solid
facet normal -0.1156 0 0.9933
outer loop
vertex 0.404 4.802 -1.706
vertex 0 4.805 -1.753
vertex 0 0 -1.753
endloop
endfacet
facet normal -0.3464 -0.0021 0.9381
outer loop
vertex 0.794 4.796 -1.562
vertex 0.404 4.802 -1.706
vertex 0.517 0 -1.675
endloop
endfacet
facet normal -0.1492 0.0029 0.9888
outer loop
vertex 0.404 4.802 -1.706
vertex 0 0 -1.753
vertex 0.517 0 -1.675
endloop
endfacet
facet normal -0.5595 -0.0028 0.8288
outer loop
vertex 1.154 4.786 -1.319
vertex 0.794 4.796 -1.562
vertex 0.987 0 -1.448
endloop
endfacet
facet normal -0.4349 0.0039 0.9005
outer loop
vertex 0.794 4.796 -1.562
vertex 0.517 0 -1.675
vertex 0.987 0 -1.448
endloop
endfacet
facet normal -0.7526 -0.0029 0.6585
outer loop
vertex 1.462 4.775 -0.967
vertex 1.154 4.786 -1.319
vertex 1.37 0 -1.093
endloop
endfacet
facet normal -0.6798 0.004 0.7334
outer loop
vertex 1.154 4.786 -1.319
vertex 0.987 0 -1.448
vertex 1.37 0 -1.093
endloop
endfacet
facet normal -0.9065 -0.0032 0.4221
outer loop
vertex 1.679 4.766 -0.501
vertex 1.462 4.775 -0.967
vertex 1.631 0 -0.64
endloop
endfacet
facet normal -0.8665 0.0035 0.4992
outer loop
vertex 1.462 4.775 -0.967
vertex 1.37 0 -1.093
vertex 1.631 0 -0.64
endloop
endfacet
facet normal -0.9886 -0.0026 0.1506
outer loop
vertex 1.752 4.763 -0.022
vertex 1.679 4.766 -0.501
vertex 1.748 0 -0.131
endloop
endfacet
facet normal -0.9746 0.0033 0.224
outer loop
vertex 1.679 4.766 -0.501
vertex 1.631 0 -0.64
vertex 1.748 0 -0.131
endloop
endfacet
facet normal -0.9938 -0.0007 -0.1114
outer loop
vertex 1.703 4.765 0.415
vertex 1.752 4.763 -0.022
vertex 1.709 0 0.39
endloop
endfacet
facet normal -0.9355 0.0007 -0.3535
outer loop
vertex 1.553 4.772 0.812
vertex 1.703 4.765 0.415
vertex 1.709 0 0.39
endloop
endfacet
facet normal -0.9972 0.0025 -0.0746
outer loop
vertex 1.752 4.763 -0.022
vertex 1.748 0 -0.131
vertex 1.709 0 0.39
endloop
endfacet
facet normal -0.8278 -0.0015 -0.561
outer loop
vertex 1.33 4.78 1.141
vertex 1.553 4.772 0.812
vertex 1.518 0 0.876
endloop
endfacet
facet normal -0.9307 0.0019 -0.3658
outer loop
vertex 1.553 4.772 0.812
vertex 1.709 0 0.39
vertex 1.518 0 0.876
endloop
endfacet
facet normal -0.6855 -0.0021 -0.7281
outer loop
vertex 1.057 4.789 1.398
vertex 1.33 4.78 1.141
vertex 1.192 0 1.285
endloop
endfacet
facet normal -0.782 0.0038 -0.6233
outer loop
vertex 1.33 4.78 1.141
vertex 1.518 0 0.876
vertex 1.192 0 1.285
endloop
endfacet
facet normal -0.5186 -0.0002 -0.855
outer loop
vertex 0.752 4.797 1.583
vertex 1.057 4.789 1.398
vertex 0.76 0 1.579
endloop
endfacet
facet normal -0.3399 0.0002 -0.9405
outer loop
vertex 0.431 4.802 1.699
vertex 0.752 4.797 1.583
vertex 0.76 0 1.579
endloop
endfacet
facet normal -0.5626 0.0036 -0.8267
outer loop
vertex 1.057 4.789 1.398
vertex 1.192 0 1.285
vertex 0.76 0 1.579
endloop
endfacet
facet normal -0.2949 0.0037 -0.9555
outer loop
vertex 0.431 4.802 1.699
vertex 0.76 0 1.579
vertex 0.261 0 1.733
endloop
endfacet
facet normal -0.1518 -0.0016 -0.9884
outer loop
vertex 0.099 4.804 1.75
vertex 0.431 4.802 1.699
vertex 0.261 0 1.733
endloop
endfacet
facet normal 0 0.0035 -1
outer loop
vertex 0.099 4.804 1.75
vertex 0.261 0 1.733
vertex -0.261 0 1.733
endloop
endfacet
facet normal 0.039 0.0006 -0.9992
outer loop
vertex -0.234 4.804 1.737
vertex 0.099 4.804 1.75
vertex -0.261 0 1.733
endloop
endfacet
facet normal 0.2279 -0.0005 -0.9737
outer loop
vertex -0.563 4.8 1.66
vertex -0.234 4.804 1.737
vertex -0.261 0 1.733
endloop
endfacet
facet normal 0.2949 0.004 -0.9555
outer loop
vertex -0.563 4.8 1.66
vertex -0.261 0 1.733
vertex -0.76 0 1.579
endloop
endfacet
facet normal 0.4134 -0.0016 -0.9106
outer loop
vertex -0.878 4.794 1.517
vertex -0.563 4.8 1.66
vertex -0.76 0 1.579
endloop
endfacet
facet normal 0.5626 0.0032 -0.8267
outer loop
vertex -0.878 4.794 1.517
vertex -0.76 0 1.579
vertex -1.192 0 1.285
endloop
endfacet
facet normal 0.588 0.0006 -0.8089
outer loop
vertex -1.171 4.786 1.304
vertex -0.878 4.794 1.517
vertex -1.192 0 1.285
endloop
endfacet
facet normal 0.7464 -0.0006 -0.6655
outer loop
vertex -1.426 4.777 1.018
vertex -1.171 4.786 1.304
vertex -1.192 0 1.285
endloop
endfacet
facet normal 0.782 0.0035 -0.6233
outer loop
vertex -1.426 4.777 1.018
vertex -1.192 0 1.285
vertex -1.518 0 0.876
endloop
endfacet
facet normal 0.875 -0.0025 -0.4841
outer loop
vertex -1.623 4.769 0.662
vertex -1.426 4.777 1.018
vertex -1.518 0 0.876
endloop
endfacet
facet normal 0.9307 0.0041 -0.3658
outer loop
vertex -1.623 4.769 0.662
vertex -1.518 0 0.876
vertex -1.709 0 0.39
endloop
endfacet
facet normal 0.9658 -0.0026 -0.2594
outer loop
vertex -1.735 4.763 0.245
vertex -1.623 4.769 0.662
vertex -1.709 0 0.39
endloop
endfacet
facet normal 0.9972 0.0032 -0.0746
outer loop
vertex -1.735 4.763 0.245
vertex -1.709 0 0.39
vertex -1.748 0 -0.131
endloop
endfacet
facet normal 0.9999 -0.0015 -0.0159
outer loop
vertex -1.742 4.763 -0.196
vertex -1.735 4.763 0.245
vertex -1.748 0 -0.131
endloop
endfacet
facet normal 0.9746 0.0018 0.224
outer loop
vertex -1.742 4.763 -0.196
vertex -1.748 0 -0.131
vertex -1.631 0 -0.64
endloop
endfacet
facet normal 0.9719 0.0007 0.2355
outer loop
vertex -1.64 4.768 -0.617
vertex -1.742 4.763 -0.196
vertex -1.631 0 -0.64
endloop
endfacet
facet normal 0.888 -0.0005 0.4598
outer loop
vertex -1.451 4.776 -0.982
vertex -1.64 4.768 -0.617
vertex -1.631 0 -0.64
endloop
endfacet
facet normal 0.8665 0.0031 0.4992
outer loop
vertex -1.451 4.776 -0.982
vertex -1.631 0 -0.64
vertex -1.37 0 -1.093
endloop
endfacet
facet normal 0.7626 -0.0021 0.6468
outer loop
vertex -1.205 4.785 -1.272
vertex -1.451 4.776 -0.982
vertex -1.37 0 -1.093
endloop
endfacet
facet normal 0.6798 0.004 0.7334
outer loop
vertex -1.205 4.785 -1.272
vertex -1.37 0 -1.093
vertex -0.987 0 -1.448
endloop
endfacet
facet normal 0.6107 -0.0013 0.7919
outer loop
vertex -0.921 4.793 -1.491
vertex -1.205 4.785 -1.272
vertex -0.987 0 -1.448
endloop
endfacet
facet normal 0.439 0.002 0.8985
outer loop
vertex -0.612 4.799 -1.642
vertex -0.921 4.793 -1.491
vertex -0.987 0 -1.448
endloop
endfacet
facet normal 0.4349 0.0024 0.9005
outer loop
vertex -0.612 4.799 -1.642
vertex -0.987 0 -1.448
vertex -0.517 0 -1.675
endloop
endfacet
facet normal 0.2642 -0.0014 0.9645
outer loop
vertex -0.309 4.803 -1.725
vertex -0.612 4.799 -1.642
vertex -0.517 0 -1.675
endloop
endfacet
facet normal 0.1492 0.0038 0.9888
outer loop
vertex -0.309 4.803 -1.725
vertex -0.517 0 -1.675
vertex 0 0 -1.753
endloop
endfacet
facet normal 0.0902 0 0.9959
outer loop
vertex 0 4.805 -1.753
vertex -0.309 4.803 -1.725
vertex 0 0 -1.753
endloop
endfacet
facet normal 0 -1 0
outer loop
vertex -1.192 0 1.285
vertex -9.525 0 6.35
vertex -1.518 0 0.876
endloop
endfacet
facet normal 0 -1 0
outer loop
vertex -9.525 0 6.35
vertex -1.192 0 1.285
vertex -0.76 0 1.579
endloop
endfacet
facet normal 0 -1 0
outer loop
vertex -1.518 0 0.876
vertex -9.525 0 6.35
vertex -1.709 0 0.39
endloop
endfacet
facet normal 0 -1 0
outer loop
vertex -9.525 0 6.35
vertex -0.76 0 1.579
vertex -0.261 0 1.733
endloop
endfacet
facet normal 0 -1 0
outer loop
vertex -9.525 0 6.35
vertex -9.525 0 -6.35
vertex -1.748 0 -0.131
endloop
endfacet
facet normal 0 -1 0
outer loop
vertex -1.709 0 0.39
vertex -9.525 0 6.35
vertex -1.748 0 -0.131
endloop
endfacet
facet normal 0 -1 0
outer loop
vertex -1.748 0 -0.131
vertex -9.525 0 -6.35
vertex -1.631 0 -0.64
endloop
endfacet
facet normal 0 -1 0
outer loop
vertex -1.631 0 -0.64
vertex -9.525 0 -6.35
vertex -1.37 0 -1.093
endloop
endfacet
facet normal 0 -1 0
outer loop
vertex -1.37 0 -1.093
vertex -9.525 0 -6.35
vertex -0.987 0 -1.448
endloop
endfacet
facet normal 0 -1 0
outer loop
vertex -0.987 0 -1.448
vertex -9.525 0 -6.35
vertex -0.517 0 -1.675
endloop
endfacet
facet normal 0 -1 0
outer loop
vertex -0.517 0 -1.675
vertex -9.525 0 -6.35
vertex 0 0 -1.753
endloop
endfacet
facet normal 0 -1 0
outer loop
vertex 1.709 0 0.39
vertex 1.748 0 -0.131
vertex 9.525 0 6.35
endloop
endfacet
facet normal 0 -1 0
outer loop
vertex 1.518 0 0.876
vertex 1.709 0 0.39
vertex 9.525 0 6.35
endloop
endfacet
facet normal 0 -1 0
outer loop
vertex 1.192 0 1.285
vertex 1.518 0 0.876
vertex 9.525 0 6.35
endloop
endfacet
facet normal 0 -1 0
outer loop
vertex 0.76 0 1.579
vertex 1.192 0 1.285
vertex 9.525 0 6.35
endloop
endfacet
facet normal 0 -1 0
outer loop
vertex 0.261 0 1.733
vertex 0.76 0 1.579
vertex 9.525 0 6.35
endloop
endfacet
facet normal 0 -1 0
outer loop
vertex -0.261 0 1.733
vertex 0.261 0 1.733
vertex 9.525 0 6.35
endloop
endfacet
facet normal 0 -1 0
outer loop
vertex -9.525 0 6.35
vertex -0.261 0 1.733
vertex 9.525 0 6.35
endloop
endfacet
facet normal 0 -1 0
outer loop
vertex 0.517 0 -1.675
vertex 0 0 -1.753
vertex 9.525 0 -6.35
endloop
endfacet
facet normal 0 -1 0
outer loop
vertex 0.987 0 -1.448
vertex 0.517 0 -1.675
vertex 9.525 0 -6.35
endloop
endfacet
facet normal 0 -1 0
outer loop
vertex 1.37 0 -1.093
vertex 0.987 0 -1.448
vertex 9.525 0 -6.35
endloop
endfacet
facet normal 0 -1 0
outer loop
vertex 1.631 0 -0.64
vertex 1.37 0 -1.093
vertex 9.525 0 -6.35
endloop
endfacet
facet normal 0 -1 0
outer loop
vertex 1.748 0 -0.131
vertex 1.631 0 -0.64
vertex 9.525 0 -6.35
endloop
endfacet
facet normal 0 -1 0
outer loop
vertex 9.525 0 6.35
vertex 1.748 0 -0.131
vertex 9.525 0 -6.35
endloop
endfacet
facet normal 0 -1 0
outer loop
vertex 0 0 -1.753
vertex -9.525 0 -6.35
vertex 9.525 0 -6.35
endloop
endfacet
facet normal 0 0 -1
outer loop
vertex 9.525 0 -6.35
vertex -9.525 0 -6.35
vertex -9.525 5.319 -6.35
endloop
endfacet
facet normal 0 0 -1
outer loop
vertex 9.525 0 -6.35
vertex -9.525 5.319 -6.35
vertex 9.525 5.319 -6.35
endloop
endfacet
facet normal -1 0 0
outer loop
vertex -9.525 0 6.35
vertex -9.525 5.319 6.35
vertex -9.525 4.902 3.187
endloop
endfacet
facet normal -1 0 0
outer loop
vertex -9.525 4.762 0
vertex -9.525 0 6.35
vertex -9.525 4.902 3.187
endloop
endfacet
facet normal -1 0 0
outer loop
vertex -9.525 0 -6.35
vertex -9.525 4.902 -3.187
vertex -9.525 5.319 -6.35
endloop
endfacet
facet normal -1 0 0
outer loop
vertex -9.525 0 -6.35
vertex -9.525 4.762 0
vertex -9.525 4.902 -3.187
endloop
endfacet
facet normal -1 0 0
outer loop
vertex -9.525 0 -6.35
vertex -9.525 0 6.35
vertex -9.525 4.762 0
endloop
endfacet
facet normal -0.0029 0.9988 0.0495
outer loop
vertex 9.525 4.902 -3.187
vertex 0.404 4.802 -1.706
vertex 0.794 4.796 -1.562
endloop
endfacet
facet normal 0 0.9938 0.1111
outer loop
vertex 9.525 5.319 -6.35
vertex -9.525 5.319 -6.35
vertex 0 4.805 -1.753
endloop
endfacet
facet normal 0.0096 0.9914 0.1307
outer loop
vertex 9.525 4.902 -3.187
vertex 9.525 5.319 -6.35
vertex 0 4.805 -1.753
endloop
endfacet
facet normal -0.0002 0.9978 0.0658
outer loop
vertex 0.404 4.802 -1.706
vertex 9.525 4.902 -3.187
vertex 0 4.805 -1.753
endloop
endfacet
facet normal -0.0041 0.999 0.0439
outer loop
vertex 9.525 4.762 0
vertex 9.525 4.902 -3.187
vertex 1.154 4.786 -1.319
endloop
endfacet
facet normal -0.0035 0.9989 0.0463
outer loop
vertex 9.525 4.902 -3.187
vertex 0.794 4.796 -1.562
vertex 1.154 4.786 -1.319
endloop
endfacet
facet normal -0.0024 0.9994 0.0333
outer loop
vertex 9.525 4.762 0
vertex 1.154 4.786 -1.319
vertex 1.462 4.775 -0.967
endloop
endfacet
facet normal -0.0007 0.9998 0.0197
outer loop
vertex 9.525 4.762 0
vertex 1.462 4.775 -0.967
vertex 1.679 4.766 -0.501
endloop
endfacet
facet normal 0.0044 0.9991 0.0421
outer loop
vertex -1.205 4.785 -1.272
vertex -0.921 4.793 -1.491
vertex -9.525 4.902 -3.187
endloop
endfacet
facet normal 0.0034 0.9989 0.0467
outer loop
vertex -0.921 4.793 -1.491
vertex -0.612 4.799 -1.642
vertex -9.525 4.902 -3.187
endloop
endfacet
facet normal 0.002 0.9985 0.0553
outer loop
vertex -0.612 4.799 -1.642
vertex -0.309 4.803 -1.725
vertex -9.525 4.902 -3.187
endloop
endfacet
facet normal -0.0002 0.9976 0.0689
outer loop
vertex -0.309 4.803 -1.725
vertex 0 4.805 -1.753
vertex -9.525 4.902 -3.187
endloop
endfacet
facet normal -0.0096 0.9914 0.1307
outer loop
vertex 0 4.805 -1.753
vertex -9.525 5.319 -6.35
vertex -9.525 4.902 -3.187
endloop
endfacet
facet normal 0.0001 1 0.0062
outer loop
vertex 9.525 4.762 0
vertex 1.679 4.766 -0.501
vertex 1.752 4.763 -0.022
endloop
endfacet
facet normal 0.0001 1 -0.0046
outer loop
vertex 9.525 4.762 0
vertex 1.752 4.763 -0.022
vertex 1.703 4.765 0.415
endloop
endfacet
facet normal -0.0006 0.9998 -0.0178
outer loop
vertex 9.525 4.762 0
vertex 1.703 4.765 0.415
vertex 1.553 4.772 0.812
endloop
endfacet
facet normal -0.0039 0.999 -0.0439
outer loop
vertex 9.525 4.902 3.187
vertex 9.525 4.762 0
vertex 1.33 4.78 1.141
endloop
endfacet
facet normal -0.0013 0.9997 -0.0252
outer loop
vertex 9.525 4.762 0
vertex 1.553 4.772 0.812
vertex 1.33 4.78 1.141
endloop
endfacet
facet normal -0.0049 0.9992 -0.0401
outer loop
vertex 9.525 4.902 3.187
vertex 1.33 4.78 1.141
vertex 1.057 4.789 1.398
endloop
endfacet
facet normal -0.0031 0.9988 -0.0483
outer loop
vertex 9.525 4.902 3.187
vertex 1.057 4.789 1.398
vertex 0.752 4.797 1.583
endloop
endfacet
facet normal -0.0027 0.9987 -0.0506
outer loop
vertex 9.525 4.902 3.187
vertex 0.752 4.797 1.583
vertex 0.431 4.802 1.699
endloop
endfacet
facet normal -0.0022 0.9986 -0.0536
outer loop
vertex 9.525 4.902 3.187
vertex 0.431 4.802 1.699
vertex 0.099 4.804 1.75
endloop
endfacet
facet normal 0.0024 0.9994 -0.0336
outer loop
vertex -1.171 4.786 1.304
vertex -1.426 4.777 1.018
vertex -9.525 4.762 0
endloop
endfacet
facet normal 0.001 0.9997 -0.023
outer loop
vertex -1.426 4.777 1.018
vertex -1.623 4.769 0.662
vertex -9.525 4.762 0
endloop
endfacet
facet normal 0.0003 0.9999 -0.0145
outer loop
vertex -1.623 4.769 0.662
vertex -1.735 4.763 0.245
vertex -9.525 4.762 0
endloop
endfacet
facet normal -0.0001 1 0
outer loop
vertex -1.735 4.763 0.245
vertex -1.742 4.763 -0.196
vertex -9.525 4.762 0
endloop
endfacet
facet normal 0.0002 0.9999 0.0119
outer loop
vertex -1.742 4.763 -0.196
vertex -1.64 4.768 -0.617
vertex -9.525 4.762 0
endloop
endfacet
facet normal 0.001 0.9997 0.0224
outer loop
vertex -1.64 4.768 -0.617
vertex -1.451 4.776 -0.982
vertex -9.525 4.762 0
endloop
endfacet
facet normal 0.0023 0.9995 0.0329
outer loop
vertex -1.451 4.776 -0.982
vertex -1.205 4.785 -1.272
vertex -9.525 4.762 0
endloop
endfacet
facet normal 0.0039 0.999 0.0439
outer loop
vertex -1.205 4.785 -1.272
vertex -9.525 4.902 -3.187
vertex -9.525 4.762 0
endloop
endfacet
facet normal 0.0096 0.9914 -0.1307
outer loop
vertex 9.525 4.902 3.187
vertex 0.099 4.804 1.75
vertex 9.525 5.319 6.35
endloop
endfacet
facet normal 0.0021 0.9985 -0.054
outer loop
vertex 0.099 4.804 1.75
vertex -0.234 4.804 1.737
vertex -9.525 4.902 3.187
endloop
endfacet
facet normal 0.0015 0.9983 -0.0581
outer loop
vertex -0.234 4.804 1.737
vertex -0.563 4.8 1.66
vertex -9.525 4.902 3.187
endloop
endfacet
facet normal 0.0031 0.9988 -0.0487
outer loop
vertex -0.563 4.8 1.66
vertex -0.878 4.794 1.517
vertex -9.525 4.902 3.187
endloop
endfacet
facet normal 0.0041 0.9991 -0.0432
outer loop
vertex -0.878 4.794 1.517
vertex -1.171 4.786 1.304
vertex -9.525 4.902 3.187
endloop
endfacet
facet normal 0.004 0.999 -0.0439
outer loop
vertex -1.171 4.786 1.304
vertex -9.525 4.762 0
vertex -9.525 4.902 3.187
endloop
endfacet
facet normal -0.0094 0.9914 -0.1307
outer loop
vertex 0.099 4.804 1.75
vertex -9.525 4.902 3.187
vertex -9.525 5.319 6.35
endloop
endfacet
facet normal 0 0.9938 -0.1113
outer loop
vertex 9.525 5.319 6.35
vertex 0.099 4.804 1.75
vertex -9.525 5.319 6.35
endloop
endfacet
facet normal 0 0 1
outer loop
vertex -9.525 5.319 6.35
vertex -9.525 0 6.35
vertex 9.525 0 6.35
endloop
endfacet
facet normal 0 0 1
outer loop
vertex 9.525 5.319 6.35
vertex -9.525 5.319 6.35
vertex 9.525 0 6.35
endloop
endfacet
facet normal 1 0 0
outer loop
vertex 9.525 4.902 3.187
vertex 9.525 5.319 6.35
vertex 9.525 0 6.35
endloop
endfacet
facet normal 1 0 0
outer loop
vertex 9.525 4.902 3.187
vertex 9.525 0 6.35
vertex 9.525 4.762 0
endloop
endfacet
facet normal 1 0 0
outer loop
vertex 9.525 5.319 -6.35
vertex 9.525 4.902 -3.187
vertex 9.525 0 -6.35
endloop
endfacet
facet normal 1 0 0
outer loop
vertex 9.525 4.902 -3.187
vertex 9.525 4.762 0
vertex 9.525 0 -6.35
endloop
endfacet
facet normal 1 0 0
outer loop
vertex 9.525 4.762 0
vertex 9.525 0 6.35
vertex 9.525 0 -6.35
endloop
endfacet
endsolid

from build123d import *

# Parameters (mm, degrees)
SKETCH1_W                       = 19.05
SKETCH1_H                       = 12.7
EXTRUDE1_DEPTH                  = 41.275
SKETCH2_R                       = 36.5125
CUT_EXTRUDE1_DEPTH              = 41.275
F_6_32_TAPPED_HOLE1_D           = 2.7051
F_6_32_TAPPED_HOLE1_DEPTH       = 9.398
F_6_32_TAPPED_HOLE1_CBORE_D     = 3.5052
F_6_32_TAPPED_HOLE1_CBORE_DEPTH = 7.112
F_6_32_TAPPED_HOLE1_TIP         = 0.81269403


with BuildPart() as part:
    # Sketch1 → Extrude1 (new body)
    with BuildSketch(Plane(origin=(0, 0, 0), x_dir=(1, 0, 0), z_dir=(0, 1, 0))):
        Rectangle(SKETCH1_W, SKETCH1_H)
    extrude(amount=EXTRUDE1_DEPTH)

    # Sketch2 → Cut-Extrude1 (cut)
    with BuildSketch(Plane.ZY.offset(9.525)):
        with Locations((0, 41.275)):
            Circle(SKETCH2_R)
    extrude(amount=-CUT_EXTRUDE1_DEPTH, mode=Mode.SUBTRACT)

    # #6-32 Tapped Hole1
    with Locations(Plane(origin=(0, 0, 0), x_dir=(0, 0, -1), z_dir=(0, -1, 0))):
        with Locations((0, 0)):
            CounterBoreHole(F_6_32_TAPPED_HOLE1_D / 2, F_6_32_TAPPED_HOLE1_CBORE_D / 2, F_6_32_TAPPED_HOLE1_CBORE_DEPTH, depth=F_6_32_TAPPED_HOLE1_DEPTH)
            with Locations((0, 0, -(F_6_32_TAPPED_HOLE1_DEPTH + F_6_32_TAPPED_HOLE1_TIP / 2))):  # 118° drill point
                Cone(0, F_6_32_TAPPED_HOLE1_D / 2, F_6_32_TAPPED_HOLE1_TIP, mode=Mode.SUBTRACT)


solid = part.part
